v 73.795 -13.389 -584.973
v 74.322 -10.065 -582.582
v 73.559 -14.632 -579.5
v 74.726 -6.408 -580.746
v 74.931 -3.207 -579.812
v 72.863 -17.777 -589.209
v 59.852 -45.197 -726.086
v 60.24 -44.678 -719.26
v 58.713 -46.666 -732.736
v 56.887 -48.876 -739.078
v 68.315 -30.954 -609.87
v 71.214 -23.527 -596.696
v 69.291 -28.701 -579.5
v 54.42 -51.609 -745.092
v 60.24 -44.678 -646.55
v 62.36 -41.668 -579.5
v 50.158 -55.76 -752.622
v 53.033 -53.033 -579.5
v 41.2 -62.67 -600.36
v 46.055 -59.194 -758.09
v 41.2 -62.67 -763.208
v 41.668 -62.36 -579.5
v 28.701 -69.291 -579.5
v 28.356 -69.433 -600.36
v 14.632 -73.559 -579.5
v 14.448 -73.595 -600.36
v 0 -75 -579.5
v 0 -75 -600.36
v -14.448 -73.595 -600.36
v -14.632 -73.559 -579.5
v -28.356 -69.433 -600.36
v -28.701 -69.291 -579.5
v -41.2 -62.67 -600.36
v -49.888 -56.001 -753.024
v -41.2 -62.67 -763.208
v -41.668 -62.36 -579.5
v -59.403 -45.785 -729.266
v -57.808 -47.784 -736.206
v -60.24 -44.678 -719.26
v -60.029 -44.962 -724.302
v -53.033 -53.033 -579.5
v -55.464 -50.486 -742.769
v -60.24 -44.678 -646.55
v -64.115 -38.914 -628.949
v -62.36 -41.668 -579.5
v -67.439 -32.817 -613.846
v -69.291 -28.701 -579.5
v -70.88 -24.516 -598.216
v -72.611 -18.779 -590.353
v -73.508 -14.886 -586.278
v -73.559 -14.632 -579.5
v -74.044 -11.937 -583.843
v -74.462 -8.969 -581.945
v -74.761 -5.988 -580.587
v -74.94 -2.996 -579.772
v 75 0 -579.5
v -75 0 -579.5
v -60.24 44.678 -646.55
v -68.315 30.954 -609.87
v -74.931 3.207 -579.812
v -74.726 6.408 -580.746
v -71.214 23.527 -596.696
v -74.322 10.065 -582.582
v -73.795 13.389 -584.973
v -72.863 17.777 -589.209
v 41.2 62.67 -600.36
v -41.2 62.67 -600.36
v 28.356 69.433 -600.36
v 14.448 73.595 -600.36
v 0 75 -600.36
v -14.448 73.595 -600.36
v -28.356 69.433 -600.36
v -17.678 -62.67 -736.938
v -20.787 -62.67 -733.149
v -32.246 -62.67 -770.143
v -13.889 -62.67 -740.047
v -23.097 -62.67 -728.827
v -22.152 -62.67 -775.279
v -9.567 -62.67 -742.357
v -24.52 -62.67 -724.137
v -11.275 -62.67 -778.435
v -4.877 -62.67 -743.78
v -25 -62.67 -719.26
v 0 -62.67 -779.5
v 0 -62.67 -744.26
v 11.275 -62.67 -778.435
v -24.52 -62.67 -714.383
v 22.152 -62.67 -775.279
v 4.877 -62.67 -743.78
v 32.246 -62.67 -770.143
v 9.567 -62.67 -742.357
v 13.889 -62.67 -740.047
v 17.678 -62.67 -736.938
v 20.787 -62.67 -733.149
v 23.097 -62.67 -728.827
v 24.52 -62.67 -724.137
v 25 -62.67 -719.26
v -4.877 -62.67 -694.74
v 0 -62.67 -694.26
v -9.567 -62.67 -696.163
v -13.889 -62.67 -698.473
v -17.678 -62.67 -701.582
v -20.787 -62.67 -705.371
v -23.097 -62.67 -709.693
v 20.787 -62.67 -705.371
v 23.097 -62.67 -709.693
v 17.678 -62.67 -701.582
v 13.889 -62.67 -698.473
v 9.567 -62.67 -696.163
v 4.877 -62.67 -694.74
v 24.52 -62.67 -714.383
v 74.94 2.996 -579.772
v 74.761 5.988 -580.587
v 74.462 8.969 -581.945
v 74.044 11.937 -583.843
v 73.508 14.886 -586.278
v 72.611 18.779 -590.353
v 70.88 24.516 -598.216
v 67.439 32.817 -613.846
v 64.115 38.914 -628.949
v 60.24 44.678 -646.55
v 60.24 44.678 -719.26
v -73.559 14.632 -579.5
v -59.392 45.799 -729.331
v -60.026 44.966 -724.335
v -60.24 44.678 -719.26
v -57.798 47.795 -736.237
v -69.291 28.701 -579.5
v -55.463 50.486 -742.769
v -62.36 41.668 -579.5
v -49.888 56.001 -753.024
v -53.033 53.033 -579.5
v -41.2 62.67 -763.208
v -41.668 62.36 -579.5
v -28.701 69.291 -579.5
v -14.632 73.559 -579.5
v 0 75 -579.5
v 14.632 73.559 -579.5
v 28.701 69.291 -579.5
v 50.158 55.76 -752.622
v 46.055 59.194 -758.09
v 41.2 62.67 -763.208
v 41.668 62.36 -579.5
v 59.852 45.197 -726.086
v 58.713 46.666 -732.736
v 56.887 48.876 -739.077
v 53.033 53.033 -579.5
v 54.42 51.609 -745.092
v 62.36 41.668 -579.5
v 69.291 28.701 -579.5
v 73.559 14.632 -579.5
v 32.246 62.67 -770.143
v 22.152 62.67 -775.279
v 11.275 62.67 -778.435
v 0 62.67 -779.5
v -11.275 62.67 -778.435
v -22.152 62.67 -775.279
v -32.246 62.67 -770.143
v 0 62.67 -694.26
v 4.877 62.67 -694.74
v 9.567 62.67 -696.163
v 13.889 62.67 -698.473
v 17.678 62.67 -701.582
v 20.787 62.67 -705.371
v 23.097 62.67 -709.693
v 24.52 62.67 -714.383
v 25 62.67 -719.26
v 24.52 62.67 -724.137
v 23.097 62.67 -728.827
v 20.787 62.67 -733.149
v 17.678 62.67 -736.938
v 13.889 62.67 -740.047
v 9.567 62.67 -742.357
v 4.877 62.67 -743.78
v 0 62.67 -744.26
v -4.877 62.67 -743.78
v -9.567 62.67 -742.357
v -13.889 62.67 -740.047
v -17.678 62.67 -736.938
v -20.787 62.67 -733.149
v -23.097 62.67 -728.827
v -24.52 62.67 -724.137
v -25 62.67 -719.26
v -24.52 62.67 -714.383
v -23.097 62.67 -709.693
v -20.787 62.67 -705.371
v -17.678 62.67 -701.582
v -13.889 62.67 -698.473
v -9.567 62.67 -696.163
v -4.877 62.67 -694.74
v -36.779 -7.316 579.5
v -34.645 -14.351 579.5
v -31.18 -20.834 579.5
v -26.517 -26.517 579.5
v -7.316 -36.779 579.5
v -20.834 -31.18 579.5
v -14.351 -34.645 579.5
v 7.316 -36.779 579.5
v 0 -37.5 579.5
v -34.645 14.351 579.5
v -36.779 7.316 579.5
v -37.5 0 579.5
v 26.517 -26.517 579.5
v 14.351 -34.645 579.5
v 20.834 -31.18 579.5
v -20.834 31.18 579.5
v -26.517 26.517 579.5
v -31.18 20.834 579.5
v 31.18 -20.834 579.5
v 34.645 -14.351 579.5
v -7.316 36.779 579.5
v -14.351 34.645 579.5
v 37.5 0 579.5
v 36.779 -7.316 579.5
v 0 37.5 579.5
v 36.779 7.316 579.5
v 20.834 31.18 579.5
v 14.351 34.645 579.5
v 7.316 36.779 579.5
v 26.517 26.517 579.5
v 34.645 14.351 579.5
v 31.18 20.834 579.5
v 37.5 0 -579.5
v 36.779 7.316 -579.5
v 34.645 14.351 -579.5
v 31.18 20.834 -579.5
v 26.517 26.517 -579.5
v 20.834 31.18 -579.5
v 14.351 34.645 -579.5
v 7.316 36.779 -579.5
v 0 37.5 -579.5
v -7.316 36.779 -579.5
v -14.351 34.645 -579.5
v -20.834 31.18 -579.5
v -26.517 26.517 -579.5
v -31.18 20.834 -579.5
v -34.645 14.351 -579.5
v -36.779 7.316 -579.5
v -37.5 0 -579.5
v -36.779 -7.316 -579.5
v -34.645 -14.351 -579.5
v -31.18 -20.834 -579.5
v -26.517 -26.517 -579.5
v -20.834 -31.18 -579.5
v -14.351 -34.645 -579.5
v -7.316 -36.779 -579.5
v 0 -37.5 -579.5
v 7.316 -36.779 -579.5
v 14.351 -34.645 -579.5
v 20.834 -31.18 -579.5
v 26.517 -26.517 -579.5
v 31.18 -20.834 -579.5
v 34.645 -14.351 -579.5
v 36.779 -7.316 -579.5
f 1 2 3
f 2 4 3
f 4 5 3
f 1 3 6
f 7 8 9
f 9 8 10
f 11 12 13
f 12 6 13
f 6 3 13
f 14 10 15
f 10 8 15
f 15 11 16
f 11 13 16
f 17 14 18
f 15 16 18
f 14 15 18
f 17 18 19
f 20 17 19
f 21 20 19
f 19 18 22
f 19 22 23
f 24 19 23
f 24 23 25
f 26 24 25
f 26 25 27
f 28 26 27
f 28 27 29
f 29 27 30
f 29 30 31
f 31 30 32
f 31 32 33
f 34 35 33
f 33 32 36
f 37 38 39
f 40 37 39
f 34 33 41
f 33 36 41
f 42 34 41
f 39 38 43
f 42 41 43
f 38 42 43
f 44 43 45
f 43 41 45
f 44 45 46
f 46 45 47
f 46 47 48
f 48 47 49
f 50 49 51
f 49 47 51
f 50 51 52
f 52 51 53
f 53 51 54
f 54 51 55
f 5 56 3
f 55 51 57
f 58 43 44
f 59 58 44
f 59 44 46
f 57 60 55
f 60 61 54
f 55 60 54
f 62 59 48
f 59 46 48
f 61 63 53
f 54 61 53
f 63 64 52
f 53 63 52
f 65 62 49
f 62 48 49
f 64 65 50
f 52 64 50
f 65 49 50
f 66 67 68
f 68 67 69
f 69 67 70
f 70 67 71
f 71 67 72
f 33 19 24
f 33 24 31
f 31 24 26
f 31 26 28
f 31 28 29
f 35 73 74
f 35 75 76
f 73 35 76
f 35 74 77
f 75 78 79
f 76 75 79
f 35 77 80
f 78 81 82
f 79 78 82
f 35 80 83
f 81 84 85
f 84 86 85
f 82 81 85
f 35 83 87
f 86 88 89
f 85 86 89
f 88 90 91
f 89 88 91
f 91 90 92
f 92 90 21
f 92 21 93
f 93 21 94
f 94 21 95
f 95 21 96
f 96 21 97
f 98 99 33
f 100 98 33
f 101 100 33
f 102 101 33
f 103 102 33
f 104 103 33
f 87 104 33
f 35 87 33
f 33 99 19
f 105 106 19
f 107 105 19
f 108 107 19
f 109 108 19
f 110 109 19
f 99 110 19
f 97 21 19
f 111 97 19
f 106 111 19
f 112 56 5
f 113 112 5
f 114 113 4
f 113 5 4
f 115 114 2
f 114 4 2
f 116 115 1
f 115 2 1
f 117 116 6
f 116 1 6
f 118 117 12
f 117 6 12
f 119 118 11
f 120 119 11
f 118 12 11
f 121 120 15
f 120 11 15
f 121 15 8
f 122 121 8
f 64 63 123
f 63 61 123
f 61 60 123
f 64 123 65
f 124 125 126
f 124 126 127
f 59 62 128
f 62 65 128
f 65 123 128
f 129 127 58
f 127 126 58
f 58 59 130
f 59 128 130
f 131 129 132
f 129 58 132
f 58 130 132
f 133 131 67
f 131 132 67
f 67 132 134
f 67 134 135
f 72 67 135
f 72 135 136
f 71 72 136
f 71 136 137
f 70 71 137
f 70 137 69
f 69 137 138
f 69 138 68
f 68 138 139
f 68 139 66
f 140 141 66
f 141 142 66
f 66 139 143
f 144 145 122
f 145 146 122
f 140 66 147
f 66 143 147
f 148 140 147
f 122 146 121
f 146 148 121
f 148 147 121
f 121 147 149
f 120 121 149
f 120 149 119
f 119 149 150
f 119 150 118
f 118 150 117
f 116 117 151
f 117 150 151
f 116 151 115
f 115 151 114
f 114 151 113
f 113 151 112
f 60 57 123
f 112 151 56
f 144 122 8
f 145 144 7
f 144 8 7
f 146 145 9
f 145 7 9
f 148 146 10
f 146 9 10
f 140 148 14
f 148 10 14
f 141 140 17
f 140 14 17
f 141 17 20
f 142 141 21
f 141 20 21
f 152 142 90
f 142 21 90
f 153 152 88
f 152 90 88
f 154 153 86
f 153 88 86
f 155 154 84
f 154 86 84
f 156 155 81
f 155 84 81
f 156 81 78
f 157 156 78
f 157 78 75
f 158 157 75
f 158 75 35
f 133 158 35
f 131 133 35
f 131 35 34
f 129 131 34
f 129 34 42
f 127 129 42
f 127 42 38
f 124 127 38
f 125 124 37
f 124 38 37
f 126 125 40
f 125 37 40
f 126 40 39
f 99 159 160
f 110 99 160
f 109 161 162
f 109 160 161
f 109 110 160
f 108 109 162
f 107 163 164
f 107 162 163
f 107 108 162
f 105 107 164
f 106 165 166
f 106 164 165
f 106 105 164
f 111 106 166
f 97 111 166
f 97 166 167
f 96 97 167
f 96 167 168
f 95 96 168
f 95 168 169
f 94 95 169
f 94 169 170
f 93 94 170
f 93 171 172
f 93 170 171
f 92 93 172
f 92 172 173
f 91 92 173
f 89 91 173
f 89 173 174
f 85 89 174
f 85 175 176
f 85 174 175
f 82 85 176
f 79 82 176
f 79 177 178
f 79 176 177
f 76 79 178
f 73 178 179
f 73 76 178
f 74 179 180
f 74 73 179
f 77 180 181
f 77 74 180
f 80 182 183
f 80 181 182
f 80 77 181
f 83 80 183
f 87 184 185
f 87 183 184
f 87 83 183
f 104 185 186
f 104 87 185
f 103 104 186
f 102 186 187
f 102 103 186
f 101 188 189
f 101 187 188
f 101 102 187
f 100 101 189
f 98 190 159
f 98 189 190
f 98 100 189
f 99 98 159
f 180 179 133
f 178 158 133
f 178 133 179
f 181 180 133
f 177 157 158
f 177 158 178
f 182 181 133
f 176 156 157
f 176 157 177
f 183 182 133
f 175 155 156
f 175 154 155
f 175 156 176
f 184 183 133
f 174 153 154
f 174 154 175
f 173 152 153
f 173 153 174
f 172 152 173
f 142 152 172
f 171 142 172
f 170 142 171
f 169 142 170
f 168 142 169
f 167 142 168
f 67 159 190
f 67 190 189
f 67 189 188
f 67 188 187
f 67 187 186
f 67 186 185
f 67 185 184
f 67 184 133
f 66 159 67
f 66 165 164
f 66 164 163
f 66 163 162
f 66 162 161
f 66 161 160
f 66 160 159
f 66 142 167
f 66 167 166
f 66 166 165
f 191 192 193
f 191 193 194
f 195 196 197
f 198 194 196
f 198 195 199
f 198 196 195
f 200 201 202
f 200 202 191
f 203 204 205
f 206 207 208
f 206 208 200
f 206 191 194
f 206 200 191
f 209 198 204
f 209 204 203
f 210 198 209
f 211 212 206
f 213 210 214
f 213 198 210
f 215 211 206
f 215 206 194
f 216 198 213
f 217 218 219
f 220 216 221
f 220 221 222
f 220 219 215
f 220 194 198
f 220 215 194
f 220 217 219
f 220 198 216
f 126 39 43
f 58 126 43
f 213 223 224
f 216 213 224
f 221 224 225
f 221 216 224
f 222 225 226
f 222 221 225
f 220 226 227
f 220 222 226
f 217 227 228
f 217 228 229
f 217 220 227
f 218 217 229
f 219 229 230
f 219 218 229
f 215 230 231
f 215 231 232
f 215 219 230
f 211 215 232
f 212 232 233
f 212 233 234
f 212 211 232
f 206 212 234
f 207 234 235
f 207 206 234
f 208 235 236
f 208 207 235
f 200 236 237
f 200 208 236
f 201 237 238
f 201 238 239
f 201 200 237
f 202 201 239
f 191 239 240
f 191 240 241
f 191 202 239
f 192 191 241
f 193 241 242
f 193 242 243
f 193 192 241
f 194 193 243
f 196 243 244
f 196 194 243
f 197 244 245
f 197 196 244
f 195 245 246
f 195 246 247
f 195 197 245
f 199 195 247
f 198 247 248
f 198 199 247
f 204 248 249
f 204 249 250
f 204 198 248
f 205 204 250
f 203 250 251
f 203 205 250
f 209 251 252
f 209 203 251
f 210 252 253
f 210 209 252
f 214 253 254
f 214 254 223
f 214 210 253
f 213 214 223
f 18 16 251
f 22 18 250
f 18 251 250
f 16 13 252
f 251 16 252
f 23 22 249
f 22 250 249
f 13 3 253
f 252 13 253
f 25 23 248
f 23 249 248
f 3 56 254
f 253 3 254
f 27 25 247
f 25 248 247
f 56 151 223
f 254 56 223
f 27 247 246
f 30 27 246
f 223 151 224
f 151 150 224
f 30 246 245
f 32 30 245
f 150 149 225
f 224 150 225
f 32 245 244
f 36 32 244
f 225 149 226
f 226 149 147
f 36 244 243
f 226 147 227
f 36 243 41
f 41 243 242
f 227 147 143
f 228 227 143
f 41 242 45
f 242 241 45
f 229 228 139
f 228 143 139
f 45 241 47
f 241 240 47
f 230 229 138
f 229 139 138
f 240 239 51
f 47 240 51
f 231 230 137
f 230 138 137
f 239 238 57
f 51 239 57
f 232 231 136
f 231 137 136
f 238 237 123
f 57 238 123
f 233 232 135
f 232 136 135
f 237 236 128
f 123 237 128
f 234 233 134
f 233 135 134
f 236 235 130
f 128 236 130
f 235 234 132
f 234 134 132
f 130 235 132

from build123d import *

# Parameters (mm, degrees)
SKETCH1_R               = 37.5
BOSS_EXTRUDE1_DEPTH     = 579.5
SKETCH2_R               = 75
BOSS_EXTRUDE2_DEPTH     = 200
CUT_EXTRUDE1_DEPTH      = 787.683068332
CUT_EXTRUDE1_DEPTH_BACK = 787.683068332
SKETCH3_R               = 25
CUT_EXTRUDE2_DEPTH      = 795.691831969
CUT_EXTRUDE2_DEPTH_BACK = 795.691831969
SKETCH5_W               = 222.214700053
SKETCH5_H               = 39.823422949


with BuildPart() as part:
    # Sketch1 → Boss-Extrude1 (new, symmetric)
    with BuildSketch(Plane.XY):
        Circle(SKETCH1_R)
    extrude(amount=BOSS_EXTRUDE1_DEPTH, both=True)

    # Sketch2 → Boss-Extrude2 (add)
    with BuildSketch(Plane(origin=(0, 0, -579.5), x_dir=(-1, 0, 0), z_dir=(0, 0, -1))):
        Circle(SKETCH2_R)
    extrude(amount=BOSS_EXTRUDE2_DEPTH)

    # Sketch3 → Cut-Extrude1 (cut, two sides: drawn at the far end of the back side and taken through both)
    with BuildSketch(Plane(origin=(0, 0, 0), x_dir=(1, 0, 0), z_dir=(0, 1, 0)).offset(-CUT_EXTRUDE1_DEPTH_BACK)):
        with Locations(Location((0, 719.26, 0), (0, 0, 270))):
            Circle(SKETCH3_R)
        with BuildLine():
            Line((75, 579.5), (60.24, 646.55))
            Line((60.24, 646.55), (60.24, 719.26))
            ThreePointArc((60.24, 719.26), (0, 779.5), (-60.24, 719.26))
            Line((-60.24, 719.26), (-60.24, 646.55))
            Line((-60.24, 646.55), (-75, 579.5))
            Line((-75, 579.5), (-116.955269632, 579.5))
            Line((-116.955269632, 579.5), (-116.955269632, 829.791162558))
            Line((-116.955269632, 829.791162558), (115.893588729, 829.791162558))
            Line((115.893588729, 829.791162558), (115.893588729, 579.5))
            Line((115.893588729, 579.5), (75, 579.5))
        make_face()
    extrude(amount=CUT_EXTRUDE1_DEPTH + CUT_EXTRUDE1_DEPTH_BACK, mode=Mode.SUBTRACT)

    # Sketch5 → Cut-Extrude2 (cut, two sides: drawn at the far end of the back side and taken through both)
    with BuildSketch(Plane.ZY.offset(60.24).offset(-CUT_EXTRUDE2_DEPTH_BACK)):
        with Locations((-711.467350027, 82.581711474)):
            Rectangle(SKETCH5_W, SKETCH5_H)
        with Locations((-711.467350027, -82.581711474)):
            Rectangle(SKETCH5_W, SKETCH5_H)
    extrude(amount=CUT_EXTRUDE2_DEPTH + CUT_EXTRUDE2_DEPTH_BACK, mode=Mode.SUBTRACT)


solid = part.part
